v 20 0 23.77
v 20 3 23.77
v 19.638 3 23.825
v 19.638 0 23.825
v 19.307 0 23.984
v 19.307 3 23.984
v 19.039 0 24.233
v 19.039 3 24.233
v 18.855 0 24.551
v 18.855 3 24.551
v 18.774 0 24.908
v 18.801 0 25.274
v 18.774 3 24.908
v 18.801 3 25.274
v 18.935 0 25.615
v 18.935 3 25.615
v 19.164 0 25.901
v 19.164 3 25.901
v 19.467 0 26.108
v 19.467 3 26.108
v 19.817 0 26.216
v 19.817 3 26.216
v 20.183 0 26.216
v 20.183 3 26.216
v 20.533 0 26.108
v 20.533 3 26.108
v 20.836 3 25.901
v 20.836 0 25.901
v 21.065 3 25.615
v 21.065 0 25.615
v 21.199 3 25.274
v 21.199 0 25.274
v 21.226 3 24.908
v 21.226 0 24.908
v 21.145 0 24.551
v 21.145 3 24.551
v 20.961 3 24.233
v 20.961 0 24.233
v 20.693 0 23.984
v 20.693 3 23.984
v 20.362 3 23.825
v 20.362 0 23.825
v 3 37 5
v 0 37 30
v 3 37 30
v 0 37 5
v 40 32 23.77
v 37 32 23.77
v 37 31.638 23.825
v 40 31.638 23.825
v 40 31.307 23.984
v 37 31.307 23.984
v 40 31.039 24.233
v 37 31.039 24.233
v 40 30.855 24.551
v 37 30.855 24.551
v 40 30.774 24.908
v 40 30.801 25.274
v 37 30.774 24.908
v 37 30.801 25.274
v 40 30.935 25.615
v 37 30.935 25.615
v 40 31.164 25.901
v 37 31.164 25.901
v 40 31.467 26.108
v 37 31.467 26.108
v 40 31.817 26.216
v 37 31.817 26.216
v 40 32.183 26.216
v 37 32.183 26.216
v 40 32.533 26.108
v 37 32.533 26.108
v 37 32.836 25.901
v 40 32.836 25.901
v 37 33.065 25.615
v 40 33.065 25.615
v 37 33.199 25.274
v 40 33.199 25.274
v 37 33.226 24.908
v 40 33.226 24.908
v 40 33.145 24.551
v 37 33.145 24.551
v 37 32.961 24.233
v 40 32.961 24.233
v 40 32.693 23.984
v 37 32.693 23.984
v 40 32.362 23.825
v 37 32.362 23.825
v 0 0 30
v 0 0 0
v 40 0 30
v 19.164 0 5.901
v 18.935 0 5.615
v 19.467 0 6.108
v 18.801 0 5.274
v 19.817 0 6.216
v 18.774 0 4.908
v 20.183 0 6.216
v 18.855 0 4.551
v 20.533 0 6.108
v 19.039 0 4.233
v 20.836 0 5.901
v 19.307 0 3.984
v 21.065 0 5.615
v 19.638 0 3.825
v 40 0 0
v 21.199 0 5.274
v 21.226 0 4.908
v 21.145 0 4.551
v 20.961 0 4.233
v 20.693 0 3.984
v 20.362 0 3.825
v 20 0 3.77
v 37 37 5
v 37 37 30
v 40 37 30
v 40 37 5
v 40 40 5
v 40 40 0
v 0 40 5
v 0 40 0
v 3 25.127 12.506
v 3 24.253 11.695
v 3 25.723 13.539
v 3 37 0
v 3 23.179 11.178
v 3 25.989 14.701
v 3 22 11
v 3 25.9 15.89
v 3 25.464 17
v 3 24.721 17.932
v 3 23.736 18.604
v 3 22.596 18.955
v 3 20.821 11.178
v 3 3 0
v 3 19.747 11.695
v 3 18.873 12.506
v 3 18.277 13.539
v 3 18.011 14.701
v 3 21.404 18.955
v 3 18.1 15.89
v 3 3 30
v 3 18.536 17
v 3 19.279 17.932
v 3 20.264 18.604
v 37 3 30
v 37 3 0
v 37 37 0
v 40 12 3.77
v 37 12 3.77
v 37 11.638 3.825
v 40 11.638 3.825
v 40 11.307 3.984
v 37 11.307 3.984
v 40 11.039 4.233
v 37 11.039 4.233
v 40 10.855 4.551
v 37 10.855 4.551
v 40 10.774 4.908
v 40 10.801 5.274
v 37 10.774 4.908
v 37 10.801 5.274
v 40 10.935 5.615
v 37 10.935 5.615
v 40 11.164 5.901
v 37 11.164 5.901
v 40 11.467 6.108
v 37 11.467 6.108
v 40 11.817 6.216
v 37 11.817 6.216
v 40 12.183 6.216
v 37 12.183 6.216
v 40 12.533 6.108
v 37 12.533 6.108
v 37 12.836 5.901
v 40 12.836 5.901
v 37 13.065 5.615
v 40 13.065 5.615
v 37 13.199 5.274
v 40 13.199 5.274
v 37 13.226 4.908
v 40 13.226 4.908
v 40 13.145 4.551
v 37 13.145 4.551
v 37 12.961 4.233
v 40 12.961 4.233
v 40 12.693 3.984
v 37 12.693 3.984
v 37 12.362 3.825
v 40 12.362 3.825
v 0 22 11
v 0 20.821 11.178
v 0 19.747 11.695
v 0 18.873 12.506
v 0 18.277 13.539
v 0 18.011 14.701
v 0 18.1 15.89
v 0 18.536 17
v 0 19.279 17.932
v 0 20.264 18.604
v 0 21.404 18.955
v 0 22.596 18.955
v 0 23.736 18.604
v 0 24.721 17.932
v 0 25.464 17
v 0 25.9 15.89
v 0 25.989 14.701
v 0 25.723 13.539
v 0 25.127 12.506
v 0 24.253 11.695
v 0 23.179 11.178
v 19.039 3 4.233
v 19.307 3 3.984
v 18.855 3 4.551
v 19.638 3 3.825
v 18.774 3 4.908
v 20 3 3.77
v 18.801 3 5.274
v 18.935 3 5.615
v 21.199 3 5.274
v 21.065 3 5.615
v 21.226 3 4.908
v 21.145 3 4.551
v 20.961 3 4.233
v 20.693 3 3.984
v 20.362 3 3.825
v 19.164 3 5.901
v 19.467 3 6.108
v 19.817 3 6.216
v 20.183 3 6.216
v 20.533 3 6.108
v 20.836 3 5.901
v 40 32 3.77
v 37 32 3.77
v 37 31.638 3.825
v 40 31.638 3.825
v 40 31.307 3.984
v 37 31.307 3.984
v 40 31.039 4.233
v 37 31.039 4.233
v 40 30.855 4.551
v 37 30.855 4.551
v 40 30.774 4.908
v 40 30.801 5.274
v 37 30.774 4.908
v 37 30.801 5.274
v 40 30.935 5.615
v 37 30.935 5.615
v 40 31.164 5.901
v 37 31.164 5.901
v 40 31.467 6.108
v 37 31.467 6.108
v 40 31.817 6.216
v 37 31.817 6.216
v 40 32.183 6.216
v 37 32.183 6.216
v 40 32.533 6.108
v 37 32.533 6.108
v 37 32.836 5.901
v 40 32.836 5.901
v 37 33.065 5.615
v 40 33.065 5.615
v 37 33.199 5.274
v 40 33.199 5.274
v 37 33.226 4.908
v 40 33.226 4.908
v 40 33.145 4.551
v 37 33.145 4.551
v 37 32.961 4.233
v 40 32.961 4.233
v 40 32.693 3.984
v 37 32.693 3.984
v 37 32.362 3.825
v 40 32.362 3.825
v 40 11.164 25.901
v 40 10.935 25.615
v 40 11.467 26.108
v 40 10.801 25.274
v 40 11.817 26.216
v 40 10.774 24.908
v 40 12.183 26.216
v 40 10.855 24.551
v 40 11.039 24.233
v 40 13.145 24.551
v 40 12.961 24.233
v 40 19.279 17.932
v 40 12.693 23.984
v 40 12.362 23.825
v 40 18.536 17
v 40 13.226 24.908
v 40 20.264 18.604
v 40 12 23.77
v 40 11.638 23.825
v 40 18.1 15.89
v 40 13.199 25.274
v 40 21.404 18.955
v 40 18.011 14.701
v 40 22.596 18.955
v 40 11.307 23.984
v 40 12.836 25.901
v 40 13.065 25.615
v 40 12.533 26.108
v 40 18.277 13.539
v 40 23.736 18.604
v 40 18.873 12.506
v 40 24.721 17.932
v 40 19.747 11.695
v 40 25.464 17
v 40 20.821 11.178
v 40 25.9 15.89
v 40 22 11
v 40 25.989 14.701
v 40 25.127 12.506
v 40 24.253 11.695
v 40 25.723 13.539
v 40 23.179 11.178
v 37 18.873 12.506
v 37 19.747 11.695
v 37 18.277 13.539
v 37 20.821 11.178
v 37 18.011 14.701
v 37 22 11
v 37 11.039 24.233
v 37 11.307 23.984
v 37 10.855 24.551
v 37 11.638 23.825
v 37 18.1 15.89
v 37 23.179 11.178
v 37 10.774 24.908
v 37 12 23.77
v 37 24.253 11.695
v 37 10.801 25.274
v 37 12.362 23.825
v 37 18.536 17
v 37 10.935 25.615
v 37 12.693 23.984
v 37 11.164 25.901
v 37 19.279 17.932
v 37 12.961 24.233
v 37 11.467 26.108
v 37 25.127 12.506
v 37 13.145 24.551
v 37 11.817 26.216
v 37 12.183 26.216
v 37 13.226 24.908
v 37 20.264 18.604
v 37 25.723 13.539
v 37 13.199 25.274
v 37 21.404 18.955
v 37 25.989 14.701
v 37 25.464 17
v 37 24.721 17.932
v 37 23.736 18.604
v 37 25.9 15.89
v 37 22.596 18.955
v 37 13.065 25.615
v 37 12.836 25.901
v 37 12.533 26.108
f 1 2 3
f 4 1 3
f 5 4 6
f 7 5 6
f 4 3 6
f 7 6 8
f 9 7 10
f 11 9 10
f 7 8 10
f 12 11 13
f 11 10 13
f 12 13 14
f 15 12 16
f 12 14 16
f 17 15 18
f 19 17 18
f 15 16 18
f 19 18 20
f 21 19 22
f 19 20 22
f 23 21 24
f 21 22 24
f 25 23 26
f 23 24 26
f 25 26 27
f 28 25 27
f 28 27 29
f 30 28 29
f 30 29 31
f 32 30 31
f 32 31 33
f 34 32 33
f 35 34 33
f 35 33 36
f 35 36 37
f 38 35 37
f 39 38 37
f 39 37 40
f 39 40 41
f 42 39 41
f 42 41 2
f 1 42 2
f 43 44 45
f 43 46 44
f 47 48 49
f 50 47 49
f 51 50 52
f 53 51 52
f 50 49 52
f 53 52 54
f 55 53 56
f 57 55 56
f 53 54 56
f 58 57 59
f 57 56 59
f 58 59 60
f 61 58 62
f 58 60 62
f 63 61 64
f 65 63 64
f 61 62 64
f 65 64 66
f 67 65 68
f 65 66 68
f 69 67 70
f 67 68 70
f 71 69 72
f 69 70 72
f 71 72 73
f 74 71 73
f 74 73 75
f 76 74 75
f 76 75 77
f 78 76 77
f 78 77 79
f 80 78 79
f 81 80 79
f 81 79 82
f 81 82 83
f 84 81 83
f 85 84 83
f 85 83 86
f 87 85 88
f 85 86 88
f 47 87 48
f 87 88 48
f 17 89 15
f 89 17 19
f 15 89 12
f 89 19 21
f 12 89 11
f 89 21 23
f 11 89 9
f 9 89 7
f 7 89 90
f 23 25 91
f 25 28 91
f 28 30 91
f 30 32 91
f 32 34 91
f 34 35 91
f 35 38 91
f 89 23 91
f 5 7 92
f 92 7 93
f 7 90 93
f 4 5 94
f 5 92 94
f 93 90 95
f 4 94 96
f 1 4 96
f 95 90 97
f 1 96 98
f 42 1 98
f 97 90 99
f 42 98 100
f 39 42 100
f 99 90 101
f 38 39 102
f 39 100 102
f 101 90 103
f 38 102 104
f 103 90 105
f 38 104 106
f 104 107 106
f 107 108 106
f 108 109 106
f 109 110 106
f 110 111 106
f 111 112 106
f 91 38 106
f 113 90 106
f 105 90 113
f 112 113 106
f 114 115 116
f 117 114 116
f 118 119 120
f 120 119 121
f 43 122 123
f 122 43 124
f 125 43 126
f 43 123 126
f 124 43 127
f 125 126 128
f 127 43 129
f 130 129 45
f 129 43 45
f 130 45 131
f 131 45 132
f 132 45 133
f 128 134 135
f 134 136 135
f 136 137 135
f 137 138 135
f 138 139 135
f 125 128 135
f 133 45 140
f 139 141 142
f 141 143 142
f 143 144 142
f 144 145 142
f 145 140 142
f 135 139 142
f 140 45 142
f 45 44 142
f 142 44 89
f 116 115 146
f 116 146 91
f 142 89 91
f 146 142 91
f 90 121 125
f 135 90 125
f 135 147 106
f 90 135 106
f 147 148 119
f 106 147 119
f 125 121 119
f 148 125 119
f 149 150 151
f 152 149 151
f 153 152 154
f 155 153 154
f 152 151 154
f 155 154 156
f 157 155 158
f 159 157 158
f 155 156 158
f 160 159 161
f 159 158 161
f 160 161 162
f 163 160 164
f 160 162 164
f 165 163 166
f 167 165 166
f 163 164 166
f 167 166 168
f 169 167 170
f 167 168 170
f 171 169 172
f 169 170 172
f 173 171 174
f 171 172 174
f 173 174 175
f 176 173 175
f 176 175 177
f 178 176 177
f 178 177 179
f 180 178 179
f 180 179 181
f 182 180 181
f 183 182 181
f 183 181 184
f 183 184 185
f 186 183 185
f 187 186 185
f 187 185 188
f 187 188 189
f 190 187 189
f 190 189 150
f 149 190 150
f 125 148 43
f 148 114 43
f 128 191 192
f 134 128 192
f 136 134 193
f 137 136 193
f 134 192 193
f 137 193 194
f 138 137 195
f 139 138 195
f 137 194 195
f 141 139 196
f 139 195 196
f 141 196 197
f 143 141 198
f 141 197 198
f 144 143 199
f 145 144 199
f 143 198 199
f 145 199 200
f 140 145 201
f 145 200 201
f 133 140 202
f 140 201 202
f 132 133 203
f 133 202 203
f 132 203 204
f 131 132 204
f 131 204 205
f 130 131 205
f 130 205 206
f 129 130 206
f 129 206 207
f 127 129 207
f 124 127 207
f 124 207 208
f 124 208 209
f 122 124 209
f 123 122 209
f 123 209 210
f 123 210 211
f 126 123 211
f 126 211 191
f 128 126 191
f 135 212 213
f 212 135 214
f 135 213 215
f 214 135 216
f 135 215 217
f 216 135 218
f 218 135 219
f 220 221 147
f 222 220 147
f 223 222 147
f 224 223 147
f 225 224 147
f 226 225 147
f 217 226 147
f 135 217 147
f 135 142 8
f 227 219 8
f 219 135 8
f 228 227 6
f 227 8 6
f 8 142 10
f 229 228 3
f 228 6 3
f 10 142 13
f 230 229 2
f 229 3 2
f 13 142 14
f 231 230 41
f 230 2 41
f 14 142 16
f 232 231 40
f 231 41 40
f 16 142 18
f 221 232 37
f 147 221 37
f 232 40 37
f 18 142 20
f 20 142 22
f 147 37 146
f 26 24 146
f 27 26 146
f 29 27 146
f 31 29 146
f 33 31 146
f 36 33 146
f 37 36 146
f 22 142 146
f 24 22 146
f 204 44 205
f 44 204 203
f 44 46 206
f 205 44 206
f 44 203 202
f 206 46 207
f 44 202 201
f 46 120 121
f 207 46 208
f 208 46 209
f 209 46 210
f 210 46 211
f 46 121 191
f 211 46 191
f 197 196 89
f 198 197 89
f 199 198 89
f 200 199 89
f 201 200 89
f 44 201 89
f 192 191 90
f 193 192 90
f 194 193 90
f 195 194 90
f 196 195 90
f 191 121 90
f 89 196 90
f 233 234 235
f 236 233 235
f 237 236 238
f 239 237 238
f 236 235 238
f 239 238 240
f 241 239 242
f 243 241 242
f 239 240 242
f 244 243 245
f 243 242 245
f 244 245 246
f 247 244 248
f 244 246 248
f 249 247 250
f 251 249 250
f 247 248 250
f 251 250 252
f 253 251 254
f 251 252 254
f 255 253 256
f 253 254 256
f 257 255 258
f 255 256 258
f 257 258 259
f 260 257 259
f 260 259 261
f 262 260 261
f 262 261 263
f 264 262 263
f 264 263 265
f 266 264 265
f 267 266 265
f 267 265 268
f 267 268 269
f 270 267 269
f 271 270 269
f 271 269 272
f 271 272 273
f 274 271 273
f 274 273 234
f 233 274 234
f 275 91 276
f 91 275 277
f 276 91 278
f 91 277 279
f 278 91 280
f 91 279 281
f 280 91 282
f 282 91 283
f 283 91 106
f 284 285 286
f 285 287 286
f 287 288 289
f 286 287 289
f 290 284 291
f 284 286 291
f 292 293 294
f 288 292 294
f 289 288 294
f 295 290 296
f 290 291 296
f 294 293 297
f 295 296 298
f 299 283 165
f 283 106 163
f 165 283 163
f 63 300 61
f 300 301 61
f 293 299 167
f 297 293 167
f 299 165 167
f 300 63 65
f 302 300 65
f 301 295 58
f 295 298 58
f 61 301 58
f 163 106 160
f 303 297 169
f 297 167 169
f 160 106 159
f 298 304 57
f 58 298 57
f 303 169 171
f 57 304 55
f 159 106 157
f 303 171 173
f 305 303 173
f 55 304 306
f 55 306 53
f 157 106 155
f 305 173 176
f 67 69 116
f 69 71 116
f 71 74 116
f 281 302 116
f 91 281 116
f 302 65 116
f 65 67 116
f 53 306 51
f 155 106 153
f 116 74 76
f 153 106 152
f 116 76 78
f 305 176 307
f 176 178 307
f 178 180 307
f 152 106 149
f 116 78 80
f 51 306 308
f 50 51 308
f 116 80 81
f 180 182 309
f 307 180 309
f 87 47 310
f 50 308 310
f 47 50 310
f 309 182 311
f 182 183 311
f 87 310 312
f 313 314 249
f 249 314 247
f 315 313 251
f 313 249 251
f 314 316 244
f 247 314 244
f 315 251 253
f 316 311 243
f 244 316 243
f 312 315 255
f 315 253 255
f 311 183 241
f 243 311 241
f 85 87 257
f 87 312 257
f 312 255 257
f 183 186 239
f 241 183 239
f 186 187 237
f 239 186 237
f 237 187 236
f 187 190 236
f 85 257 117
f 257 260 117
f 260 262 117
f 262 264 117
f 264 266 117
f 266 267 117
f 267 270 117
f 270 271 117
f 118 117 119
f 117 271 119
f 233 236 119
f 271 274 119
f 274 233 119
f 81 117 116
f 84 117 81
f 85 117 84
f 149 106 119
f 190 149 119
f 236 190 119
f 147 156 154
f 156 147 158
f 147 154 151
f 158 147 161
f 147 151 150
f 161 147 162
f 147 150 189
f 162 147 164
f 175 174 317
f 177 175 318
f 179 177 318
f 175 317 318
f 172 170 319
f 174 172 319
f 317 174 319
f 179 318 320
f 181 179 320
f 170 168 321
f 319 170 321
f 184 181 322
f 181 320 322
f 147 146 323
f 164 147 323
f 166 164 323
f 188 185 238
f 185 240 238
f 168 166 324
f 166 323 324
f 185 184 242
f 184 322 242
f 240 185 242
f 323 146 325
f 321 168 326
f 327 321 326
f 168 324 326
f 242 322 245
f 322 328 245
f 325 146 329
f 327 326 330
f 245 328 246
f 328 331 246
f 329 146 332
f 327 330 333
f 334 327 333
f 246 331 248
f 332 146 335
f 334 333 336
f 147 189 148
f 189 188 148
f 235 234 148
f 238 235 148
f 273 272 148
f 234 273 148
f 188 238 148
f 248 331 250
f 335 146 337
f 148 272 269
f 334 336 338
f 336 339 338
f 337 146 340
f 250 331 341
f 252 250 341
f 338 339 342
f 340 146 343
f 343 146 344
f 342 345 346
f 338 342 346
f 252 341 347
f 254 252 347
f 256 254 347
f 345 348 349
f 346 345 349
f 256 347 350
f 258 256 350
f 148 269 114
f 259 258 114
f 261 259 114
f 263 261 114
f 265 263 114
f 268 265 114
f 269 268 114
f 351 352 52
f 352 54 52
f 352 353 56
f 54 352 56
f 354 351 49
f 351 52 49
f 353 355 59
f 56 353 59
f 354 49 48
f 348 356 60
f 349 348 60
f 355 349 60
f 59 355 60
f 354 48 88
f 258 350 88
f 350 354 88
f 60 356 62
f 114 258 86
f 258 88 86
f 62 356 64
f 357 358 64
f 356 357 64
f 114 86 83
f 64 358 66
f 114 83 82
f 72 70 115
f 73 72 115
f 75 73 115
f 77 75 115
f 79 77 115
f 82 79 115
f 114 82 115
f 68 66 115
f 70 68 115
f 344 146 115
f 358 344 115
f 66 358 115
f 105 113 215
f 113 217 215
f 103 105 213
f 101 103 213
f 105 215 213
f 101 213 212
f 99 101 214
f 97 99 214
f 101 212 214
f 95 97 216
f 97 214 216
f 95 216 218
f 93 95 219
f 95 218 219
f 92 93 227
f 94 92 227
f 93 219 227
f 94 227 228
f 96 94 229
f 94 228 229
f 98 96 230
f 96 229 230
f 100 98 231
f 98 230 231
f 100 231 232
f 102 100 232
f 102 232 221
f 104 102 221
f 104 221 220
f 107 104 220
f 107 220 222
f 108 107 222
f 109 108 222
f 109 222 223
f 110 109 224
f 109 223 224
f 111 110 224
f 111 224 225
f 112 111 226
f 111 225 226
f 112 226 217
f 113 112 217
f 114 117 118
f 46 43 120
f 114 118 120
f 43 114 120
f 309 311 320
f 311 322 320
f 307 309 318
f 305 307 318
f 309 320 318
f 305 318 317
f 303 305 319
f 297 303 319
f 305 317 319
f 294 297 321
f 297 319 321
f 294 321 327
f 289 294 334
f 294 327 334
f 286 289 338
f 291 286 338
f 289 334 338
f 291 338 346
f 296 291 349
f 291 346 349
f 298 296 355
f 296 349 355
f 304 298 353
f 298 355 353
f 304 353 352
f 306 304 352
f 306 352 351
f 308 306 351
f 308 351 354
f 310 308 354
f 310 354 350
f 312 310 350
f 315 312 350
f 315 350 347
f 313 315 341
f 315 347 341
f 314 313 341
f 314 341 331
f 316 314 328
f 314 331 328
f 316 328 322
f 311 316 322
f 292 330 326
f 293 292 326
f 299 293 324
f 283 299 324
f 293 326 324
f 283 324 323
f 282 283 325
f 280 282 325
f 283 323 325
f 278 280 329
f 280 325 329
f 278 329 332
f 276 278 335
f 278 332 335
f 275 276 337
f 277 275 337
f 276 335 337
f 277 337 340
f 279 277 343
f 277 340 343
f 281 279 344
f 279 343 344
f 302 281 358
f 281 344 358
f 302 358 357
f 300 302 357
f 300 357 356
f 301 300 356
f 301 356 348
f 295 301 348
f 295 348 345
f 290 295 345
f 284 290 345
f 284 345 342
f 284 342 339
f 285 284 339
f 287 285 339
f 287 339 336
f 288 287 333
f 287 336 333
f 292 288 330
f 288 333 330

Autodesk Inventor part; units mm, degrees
ref_plane "YZ Plane" through (0, 0, 0) normal (1, 0, 0) x (0, 1, 0)
ref_plane "XZ Plane" through (0, 0, 0) normal (0, 1, 0) x (-1, 0, 0)
ref_plane "XY Plane" through (0, 0, 0) normal (0, 0, 1) x (1, 0, 0)
sketch "スケッチ1" plane through (0, 0, 0) normal (0, 0, 1) x (1, 0, 0)
  line L0 (0, 0) -> (40, 0)
  line L1 (40, 0) -> (40, 40)
  line L2 (40, 40) -> (0, 40)
  line L3 (0, 40) -> (0, 0)
  dimension "d0" = 40
  dimension "d1" = 40
extrude "押し出し1" add sketch "スケッチ1" along normal blind 40
sketch "スケッチ2" plane through (0, 0, 0) normal (0, 0, -1) x (-1, 0, 0)
  point P0 (0, 0)
sketch "スケッチ3" plane through (0, 0, 40) normal (0, 0, 1) x (1, 0, 0)
  line L0 (3, 3) -> (37, 3)
  line L1 (37, 3) -> (37, 37)
  line L2 (37, 37) -> (3, 37)
  line L3 (3, 37) -> (3, 3)
  line L4 (0, 40) -> (0, 0) projected
  line L5 (40, 40) -> (0, 40) projected
  line L6 (40, 0) -> (40, 40) projected
  line L7 (0, 0) -> (40, 0) projected
  dimension "d4" = 3
  dimension "d5" = 3
  dimension "d6" = 3
  dimension "d7" = 3
extrude "押し出し2" cut sketch "スケッチ3" against normal through all contours L3 L2 L1 L0
sketch "スケッチ4" plane through (0, 40, 0) normal (0, 1, 0) x (1, 0, 0)
  line L0 (0, 0) -> (0, -40) projected
  line L1 (40, 0) -> (40, -40) projected
  line L2 (0, -40) -> (40, -40)
  line L3 (40, -40) -> (40, -5)
  line L4 (40, -5) -> (0, -5)
  line L5 (0, -5) -> (0, -40)
  line L6 (40, 0) -> (0, 0) projected
  point P0 (0, -5)
  dimension "d10" = 5
extrude "押し出し3" cut sketch "スケッチ4" against normal blind 3 contours L4 L1 L2 L0
sketch "スケッチ5" plane through (0, 0, 0) normal (0, -1, 0) x (1, 0, 0)
  line L0 (0, 40) -> (0, 5) projected
  line L1 (0, 30) -> (40, 30)
  line L2 (40, 5) -> (40, 40) projected
  line L3 (0, 40) -> (40, 40) projected
  point P0 (0, 0)
  dimension "d13" = 10
extrude "押し出し4" cut sketch "スケッチ5" against normal through all
sketch "スケッチ6" plane through (0, 37, 0) normal (0, 1, 0) x (1, 0, 0)
  point P0 (0, 0)
sketch "スケッチ7" plane through (0, 0, 0) normal (0, -1, 0) x (1, 0, 0)
  line L0 (40, 30) -> (0, 30) projected
  line L1 (0, 0) -> (40, 0) projected
  line L2 (40, 0) -> (40, 30) projected
  point P0 (20, 5)
  point P1 (20, 25)
  dimension "d16" = 5
  dimension "d17" = 5
  dimension "d18" = 20
  dimension "d19" = 20
hole "穴1" at (20, 0, 5) at (20, 0, 25) direction (0, 1, 0) diameter 2.459 depth 3 thread size "M3x0.5" class "6H" standard "ANSI Metric M Profile"
sketch "スケッチ8" plane through (40, 0, 0) normal (1, 0, 0) x (0, 0, -1)
  line L0 (-30, 37) -> (-30, 0) projected
  line L1 (-5, 37) -> (-30, 37) projected
  line L2 (0, 0) -> (-30, 0) projected
  line L3 (0, 0) -> (0, 40) projected
  line L4 (0, 40) -> (-5, 40) projected
  point P0 (-25, 32)
  point P1 (-5, 32)
  point P2 (-5, 12)
  point P3 (-25, 12)
  dimension "d27" = 5
  dimension "d28" = 5
  dimension "d29" = 5
  dimension "d30" = 12
  dimension "d31" = 12
  dimension "d32" = 5
  dimension "d33" = 5
  dimension "d34" = 8
hole "穴2" at (40, 32, 25) at (40, 32, 5) at (40, 12, 25) at (40, 12, 5) direction (-1, 0, 0) diameter 2.459 depth 3 thread size "M3x0.5" class "6H" standard "ANSI Metric M Profile"
sketch "スケッチ9" plane through (40, 0, 0) normal (1, 0, 0) x (0, 0, -1)
  line L0 (-30, 37) -> (-30, 0) projected
  line L1 (-5, 37) -> (-30, 37) projected
  line L2 (0, 0) -> (-30, 0) projected
  point P0 (-15, 22)
  dimension "d42" = 15
  dimension "d44" = 22
hole "穴3" at (40, 22, 15) direction (-1, 0, 0) diameter 8 end through all
properties part number "3SR02_振子支え"
